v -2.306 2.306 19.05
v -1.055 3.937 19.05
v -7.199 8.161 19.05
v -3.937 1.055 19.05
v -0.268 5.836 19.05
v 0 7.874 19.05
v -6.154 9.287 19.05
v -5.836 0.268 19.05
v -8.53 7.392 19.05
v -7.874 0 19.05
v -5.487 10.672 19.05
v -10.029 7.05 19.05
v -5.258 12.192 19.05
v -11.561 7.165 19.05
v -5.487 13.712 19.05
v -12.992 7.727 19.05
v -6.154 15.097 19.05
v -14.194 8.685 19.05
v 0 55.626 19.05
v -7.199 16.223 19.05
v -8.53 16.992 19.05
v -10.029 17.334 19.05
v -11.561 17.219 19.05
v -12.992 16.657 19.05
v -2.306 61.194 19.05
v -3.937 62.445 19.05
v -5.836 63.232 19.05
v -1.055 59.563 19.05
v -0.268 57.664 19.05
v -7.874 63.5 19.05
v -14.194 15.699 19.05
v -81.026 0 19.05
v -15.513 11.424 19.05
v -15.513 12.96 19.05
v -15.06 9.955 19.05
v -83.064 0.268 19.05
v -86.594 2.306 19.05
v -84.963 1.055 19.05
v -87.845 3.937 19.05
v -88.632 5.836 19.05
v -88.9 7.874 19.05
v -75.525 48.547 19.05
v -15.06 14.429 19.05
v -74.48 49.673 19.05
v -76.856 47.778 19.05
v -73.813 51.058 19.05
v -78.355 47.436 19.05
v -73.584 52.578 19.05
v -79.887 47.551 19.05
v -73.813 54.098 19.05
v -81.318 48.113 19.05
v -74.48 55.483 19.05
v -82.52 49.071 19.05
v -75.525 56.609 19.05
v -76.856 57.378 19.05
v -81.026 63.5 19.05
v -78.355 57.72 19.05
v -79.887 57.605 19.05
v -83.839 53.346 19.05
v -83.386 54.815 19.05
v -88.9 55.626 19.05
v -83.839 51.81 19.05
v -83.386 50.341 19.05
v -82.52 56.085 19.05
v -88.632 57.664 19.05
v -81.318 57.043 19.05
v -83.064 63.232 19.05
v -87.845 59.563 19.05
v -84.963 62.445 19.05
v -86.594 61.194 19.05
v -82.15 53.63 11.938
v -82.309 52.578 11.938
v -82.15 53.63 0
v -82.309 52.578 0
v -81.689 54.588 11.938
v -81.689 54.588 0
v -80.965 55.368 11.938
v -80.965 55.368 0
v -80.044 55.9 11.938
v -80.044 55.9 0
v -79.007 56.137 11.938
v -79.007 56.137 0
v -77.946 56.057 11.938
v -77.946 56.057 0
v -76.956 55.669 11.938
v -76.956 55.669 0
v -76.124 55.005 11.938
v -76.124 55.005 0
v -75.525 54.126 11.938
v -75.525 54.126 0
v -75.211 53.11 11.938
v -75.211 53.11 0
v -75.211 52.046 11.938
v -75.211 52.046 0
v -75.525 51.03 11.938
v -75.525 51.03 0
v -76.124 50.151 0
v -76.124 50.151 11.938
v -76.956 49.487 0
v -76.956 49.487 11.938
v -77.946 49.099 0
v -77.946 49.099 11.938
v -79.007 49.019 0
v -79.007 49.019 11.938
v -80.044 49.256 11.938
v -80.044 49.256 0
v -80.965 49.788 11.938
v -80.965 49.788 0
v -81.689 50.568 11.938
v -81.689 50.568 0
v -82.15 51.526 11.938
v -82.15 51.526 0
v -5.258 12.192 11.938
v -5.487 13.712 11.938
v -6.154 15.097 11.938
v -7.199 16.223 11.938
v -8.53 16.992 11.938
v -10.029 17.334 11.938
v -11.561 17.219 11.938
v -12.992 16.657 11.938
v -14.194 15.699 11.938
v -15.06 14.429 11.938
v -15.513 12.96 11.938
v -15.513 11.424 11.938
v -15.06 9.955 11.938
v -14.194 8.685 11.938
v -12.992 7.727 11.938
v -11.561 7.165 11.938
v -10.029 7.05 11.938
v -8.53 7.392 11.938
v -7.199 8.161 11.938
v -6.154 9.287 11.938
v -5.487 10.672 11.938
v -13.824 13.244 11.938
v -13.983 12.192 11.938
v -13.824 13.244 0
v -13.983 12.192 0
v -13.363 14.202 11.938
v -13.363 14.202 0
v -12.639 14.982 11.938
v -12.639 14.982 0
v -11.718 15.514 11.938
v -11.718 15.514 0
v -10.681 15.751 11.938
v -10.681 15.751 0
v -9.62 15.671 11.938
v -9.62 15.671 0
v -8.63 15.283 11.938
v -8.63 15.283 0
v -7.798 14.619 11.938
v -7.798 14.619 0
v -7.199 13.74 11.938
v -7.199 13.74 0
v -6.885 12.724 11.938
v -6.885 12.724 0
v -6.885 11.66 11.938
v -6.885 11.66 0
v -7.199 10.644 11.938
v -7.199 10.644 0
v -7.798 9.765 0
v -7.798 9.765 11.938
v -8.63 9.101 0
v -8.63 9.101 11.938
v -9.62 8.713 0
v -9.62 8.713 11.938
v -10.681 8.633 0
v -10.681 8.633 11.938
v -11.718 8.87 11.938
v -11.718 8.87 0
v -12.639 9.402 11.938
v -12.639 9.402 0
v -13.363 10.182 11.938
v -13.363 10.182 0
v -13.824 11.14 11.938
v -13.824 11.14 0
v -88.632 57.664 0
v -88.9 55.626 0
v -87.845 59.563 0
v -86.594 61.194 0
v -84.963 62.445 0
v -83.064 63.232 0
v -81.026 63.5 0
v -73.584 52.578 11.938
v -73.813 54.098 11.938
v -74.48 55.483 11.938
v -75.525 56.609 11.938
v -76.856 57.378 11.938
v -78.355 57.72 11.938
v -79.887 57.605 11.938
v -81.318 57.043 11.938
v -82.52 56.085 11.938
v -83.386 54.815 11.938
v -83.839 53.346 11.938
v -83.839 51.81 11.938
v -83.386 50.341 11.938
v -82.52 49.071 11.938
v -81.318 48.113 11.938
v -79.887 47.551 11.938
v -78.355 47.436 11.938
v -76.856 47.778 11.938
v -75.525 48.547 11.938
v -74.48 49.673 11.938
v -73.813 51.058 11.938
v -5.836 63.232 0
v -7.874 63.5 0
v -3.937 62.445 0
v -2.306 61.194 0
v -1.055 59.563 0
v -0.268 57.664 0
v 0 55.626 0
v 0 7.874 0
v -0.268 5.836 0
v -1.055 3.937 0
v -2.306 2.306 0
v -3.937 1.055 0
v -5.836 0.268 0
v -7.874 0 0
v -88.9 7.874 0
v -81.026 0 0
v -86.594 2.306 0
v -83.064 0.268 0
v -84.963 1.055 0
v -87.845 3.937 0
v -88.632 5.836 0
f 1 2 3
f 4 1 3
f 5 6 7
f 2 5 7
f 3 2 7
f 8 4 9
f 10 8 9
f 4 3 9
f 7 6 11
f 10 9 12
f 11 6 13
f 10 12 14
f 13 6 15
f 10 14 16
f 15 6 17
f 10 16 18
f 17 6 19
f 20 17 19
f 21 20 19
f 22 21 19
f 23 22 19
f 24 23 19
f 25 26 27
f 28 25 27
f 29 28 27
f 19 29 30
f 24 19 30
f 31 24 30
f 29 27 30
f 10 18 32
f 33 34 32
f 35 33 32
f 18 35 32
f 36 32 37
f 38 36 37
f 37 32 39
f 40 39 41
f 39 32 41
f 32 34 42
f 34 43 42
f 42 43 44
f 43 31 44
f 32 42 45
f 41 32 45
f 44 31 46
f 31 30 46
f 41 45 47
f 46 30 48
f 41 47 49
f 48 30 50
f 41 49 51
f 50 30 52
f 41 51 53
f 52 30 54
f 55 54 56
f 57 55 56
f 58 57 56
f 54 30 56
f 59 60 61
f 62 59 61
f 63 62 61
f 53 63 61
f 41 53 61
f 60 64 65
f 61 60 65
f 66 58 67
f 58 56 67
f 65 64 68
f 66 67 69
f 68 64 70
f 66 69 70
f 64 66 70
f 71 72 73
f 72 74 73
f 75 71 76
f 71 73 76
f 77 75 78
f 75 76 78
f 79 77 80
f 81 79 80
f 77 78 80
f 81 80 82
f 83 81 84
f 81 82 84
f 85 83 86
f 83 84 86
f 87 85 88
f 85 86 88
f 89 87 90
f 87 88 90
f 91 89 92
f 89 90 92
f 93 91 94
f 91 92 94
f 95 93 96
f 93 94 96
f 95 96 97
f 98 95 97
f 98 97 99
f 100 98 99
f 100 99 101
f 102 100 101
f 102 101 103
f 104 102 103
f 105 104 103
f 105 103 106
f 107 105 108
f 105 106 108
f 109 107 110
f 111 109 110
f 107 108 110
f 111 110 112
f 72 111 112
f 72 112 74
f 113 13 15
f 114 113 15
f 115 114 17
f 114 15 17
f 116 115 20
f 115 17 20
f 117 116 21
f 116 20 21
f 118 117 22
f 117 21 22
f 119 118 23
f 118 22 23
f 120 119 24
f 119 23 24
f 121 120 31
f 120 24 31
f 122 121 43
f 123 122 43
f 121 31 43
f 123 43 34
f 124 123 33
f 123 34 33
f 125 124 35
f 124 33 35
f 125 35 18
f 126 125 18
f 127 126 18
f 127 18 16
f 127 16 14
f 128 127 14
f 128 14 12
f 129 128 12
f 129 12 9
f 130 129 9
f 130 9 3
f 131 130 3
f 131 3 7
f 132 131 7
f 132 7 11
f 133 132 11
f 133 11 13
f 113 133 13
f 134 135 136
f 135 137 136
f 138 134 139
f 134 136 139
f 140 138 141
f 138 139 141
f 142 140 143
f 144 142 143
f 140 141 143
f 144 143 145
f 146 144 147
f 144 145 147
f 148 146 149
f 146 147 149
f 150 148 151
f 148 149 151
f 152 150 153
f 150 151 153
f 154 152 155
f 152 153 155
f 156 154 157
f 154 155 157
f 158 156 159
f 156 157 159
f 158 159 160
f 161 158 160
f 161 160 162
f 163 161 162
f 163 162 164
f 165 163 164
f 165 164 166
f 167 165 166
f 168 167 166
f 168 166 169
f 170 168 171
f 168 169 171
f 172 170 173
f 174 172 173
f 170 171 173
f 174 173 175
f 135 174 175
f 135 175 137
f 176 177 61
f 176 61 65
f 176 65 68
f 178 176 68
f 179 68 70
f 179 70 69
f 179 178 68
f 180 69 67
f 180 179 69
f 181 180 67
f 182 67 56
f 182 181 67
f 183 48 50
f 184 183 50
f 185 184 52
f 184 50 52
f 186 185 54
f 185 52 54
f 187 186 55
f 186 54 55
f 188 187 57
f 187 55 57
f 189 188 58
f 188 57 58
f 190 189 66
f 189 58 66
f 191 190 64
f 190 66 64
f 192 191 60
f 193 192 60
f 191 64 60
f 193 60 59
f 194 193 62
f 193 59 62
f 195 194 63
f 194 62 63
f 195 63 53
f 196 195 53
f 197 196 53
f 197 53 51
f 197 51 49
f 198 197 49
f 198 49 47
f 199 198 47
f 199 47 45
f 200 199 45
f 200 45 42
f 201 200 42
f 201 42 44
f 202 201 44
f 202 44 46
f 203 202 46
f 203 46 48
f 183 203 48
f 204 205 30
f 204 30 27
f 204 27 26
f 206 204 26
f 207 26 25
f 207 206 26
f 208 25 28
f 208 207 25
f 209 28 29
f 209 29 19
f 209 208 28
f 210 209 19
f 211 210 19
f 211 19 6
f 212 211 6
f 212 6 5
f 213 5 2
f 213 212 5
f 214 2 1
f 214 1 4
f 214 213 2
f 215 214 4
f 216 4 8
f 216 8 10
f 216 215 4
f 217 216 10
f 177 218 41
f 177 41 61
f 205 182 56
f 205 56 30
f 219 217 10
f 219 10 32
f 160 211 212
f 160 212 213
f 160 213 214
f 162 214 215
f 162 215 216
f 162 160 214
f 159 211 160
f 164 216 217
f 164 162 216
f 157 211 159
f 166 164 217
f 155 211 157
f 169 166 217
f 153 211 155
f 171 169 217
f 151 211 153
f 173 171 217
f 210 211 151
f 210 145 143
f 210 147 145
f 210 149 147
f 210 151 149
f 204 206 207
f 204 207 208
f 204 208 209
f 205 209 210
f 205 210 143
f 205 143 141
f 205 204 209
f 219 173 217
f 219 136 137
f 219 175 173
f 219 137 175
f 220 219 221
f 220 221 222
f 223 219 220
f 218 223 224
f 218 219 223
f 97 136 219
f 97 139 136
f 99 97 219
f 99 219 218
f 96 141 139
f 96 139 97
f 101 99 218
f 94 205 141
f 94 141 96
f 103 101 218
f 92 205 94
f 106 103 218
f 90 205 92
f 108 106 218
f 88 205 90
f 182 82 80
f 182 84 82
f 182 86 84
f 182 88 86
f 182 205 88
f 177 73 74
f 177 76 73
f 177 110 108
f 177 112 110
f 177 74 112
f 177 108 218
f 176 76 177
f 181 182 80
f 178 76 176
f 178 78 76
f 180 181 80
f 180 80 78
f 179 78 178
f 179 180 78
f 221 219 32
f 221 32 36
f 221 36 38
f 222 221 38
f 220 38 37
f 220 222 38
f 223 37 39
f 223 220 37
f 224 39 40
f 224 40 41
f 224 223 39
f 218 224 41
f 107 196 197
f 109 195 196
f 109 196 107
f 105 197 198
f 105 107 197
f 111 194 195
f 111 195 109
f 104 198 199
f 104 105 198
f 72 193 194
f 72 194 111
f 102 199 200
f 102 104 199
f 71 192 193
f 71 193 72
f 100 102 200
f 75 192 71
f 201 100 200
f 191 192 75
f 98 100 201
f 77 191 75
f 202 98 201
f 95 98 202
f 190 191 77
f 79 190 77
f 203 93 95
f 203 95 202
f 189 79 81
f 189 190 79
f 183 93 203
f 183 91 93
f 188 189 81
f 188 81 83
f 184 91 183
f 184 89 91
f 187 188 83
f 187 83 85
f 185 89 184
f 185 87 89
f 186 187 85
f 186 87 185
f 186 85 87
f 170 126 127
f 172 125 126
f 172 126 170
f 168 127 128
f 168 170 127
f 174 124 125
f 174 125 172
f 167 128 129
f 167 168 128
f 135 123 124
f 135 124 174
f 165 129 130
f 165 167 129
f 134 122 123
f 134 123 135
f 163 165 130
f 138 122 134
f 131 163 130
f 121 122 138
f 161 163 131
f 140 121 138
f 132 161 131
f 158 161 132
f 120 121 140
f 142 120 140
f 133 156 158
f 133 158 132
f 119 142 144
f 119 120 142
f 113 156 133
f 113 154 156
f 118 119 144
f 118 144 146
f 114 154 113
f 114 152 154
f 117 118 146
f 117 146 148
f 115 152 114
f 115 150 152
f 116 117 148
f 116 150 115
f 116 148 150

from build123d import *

# Parameters (mm, degrees)
DIE_DEPTH                                      = 19.05
DRILL_CBORE_FOR_1_4_SHCS_SHALLOW_1_D           = 7.1374
DRILL_CBORE_FOR_1_4_SHCS_SHALLOW_1_CBORE_D     = 10.3124
DRILL_CBORE_FOR_1_4_SHCS_SHALLOW_1_CBORE_DEPTH = 7.112


with BuildPart() as part:
    # Sketch1 → Die (new body)
    with BuildSketch(Plane.XY):
        with BuildLine():
            Line((-81.026, 63.5), (-7.874, 63.5))
            ThreePointArc((-7.874, 63.5), (-2.306241205, 61.193758795), (0, 55.626))
            Line((0, 55.626), (0, 7.874))
            ThreePointArc((0, 7.874), (-2.306241205, 2.306241205), (-7.874, 0))
            Line((-7.874, 0), (-81.026, 0))
            ThreePointArc((-81.026, 0), (-86.593758795, 2.306241205), (-88.9, 7.874))
            Line((-88.9, 7.874), (-88.9, 55.626))
            ThreePointArc((-88.9, 55.626), (-86.593758795, 61.193758795), (-81.026, 63.5))
        make_face()
    extrude(amount=DIE_DEPTH)

    # Drill&CBore For 1/4 SHCS (Shallow)1 (through all)
    with Locations(Plane.XY.offset(19.05)):
        with Locations((-10.414, 12.192), (-78.74, 52.578)):
            CounterBoreHole(DRILL_CBORE_FOR_1_4_SHCS_SHALLOW_1_D / 2, DRILL_CBORE_FOR_1_4_SHCS_SHALLOW_1_CBORE_D / 2, DRILL_CBORE_FOR_1_4_SHCS_SHALLOW_1_CBORE_DEPTH)


solid = part.part
